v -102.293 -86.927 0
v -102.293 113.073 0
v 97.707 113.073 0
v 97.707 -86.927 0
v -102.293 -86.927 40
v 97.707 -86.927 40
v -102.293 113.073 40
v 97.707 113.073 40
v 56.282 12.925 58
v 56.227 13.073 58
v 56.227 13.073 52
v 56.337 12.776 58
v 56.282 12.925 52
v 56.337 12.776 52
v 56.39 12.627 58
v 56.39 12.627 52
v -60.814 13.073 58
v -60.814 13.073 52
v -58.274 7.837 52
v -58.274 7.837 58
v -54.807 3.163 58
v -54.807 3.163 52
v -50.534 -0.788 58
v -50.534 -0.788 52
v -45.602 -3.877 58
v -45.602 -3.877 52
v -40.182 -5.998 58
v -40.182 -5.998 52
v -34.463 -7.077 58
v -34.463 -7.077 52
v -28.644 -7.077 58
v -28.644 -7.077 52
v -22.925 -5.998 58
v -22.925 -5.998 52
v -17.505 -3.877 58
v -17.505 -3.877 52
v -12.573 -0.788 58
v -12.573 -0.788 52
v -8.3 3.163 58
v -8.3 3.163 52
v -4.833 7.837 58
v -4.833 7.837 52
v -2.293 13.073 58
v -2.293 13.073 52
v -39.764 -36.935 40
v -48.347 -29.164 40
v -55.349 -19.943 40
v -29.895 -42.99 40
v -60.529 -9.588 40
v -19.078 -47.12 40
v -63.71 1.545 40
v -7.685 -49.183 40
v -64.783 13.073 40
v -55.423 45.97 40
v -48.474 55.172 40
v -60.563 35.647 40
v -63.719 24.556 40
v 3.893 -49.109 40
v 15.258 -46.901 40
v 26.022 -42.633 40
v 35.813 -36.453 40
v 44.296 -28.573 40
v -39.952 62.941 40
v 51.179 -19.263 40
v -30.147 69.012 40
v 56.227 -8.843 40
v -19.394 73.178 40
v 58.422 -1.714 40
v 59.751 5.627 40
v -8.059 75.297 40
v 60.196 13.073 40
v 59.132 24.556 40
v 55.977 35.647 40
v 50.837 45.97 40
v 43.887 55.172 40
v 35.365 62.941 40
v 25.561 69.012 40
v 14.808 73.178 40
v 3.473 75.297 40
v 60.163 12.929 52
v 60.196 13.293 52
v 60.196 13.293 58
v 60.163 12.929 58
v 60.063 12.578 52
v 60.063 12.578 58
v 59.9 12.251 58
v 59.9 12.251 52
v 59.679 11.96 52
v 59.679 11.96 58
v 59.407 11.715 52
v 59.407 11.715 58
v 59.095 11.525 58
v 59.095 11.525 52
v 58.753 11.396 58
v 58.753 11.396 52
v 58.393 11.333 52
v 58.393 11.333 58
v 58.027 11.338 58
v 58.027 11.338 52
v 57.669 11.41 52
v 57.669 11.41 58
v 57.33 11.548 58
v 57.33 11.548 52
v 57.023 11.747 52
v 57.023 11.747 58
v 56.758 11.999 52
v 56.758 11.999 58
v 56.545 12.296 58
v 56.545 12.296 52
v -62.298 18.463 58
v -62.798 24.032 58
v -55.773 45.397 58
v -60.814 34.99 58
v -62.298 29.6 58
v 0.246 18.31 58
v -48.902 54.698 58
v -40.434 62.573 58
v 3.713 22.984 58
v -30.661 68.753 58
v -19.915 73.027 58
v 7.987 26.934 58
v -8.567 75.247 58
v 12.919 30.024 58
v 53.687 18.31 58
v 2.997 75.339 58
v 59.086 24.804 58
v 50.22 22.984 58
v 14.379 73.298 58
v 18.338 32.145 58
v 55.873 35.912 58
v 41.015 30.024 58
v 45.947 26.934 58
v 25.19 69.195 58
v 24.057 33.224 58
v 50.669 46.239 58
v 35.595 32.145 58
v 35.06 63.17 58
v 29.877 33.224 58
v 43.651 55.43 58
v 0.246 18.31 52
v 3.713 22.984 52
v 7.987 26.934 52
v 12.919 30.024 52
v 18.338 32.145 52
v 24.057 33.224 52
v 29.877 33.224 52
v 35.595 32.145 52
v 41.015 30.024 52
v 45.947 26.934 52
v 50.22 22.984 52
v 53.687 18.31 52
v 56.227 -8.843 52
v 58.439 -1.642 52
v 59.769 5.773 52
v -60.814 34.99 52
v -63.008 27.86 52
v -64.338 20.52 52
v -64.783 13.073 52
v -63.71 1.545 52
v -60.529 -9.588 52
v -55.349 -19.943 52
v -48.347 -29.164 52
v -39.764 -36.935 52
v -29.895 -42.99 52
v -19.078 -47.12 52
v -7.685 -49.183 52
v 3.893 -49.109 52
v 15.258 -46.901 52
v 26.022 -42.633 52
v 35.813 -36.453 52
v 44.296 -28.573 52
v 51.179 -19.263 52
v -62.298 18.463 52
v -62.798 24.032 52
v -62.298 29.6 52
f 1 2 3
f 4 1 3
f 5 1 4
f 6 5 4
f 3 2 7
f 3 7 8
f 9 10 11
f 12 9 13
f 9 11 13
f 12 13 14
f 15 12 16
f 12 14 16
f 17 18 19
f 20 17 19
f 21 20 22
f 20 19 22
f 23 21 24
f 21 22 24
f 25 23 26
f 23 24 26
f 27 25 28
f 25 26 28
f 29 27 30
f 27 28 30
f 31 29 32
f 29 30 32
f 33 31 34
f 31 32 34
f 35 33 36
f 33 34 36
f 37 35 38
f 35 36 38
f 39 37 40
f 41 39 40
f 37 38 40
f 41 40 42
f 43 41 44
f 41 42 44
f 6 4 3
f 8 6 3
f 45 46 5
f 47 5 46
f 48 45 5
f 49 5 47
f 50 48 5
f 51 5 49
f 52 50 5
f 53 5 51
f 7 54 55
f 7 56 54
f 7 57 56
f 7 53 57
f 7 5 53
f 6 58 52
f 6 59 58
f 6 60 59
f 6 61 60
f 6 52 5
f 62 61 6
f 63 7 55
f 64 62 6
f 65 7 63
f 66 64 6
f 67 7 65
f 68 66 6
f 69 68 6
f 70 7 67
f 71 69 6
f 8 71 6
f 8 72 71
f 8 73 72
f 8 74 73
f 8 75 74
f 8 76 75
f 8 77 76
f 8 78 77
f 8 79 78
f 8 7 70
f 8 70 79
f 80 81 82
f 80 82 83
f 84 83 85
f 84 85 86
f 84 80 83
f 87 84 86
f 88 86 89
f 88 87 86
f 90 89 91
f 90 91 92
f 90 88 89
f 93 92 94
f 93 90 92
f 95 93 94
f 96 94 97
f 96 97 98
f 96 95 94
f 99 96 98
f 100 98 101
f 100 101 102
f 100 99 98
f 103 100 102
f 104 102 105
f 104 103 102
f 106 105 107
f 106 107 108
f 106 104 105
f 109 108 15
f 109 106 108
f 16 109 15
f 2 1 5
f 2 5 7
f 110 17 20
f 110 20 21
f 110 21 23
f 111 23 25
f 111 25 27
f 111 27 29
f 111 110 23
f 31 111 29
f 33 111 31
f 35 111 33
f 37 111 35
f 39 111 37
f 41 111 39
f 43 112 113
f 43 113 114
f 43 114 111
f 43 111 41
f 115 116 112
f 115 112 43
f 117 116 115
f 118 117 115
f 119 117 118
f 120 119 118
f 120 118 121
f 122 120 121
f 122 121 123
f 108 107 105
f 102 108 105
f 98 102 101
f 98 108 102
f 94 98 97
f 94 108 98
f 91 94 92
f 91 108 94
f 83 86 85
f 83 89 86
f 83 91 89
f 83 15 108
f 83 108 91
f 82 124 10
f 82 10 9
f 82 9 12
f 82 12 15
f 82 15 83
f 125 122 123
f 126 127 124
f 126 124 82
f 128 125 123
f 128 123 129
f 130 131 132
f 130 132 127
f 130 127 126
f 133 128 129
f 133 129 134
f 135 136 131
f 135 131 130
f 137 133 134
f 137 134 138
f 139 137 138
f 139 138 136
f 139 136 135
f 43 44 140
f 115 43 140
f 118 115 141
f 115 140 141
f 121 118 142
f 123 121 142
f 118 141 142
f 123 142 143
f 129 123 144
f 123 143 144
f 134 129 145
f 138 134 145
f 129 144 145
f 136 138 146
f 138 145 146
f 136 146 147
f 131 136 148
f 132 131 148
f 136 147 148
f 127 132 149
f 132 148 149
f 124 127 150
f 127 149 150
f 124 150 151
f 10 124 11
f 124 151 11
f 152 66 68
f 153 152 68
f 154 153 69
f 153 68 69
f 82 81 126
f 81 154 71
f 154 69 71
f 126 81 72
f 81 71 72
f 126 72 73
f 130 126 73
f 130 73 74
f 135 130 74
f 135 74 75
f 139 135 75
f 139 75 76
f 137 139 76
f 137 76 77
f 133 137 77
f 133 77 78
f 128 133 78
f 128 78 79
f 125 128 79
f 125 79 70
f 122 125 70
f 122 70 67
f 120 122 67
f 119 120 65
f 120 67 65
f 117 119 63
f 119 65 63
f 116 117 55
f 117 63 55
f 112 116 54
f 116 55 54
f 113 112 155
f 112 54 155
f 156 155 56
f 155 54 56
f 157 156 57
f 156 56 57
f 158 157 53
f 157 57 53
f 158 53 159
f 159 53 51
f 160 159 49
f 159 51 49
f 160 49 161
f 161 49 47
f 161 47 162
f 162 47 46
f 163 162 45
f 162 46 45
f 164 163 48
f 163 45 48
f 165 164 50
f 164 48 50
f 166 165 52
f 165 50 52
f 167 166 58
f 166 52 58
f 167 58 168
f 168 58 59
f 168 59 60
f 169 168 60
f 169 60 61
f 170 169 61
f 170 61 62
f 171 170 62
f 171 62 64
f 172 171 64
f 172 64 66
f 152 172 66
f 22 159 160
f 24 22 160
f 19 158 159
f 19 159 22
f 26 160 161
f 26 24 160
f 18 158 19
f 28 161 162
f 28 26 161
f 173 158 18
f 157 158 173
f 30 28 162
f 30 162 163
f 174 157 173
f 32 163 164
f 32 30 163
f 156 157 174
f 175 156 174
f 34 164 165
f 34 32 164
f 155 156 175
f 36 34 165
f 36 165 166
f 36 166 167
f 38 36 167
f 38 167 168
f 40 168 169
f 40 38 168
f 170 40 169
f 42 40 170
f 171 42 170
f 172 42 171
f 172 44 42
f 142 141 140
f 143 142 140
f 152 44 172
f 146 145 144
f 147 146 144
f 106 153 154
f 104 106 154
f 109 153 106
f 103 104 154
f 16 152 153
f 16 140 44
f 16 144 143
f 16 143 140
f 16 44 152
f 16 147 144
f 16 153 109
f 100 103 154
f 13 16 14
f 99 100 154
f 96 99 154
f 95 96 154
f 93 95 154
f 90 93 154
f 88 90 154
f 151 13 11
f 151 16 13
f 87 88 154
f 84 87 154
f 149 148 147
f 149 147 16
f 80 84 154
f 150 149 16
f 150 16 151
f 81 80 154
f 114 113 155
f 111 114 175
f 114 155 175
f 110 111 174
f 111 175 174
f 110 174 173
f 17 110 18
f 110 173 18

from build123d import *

# Parameters (mm, degrees)
F0_W        = 200
F0_H        = 200
F1_DEPTH    = 40
F3_DEPTH    = 12
F4_DEPTH    = 18
F5_T1_DEPTH = 62.2240943671


# Not quite as in the source:
# - a fillet or chamfer that OpenCascade refuses, or shapes differently, is made with other operations: its cross-section is extruded or revolved along the edge and cut away or added


with BuildPart() as f1:
    # F0 (on Top) → F1 (new body)
    with BuildSketch(Plane.XY):
        with Locations((-2.2933091968, 13.0733736824)):
            Rectangle(F0_W, F0_H)
    extrude(amount=F1_DEPTH)

    # F2 (on face) → F3 (join)
    with BuildSketch(Plane.XY.offset(40)):
        with BuildLine():
            Line((56.2270847505, 13.0733736824), (60.1964650758, 13.0733736824))
            ThreePointArc((60.1964650758, 13.0733736824), (8.8432450397, 74.5627959303), (-60.8137031442, 34.9899286326))
            ThreePointArc((-60.8137031442, 34.9899286326), (-62.7983933068, 24.0316511575), (-60.8137031442, 13.0733736824))
            Line((-60.8137031442, 13.0733736824), (-2.2933091968, 13.0733736824))
            ThreePointArc((-2.2933091968, 13.0733736824), (26.9668877768, 33.3599833436), (56.2270847505, 13.0733736824))
        make_face()
        with BuildLine():
            Line((-2.2933091968, 13.0733736824), (-60.8137031442, 13.0733736824))
            ThreePointArc((-60.8137031442, 13.0733736824), (-31.5535061705, -7.2132359788), (-2.2933091968, 13.0733736824))
        make_face()
        with BuildLine():
            ThreePointArc((-64.7830834694, 13.0733736824), (-13.4298634334, -48.4160485655), (56.2270847505, -8.8431812678))
            ThreePointArc((56.2270847505, -8.8431812678), (58.2117749131, 2.1150962073), (56.2270847505, 13.0733736824))
            Line((56.2270847505, 13.0733736824), (-2.2933091968, 13.0733736824))
            ThreePointArc((-2.2933091968, 13.0733736824), (-31.5535061705, -7.2132359788), (-60.8137031442, 13.0733736824))
            Line((-60.8137031442, 13.0733736824), (-64.7830834694, 13.0733736824))
        make_face()
        with BuildLine():
            ThreePointArc((-60.8137031442, 13.0733736824), (-62.7983933068, 24.0316511575), (-60.8137031442, 34.9899286326))
            ThreePointArc((-60.8137031442, 34.9899286326), (-63.7827314447, 24.2099279189), (-64.7830834694, 13.0733736824))
            Line((-64.7830834694, 13.0733736824), (-60.8137031442, 13.0733736824))
        make_face()
        with BuildLine():
            Line((-2.2933091968, 13.0733736824), (56.2270847505, 13.0733736824))
            ThreePointArc((56.2270847505, 13.0733736824), (26.9668877768, 33.3599833436), (-2.2933091968, 13.0733736824))
        make_face()
        with BuildLine():
            ThreePointArc((56.2270847505, -8.8431812678), (59.196113051, 1.9368194459), (60.1964650758, 13.0733736824))
            Line((60.1964650758, 13.0733736824), (56.2270847505, 13.0733736824))
            ThreePointArc((56.2270847505, 13.0733736824), (58.2117749131, 2.1150962073), (56.2270847505, -8.8431812678))
        make_face()
    extrude(amount=F3_DEPTH)

    # F2 (on face) → F4 (join)
    with BuildSketch(Plane.XY.offset(40)):
        with BuildLine():
            Line((56.2270847505, 13.0733736824), (60.1964650758, 13.0733736824))
            ThreePointArc((60.1964650758, 13.0733736824), (8.8432450397, 74.5627959303), (-60.8137031442, 34.9899286326))
            ThreePointArc((-60.8137031442, 34.9899286326), (-62.7983933068, 24.0316511575), (-60.8137031442, 13.0733736824))
            Line((-60.8137031442, 13.0733736824), (-2.2933091968, 13.0733736824))
            ThreePointArc((-2.2933091968, 13.0733736824), (26.9668877768, 33.3599833436), (56.2270847505, 13.0733736824))
        make_face()
        with BuildLine():
            Line((-2.2933091968, 13.0733736824), (-60.8137031442, 13.0733736824))
            ThreePointArc((-60.8137031442, 13.0733736824), (-31.5535061705, -7.2132359788), (-2.2933091968, 13.0733736824))
        make_face()
        with BuildLine():
            ThreePointArc((56.2270847505, -8.8431812678), (59.196113051, 1.9368194459), (60.1964650758, 13.0733736824))
            Line((60.1964650758, 13.0733736824), (56.2270847505, 13.0733736824))
            ThreePointArc((56.2270847505, 13.0733736824), (58.2117749131, 2.1150962073), (56.2270847505, -8.8431812678))
        make_face()
    extrude(amount=F4_DEPTH)

    # F5: fillet of radius 1.96 on 2 edges, made by hand

    # F5_s2 → F5_t1 (cut)
    with BuildSketch(Plane.XY.offset(52)):
        with BuildLine():
            ThreePointArc((60.196077506, 13.2934603584), (58.5741142709, 11.3559254547), (56.3903482373, 12.627134387))
            ThreePointArc((56.3903482373, 12.627134387), (58.2108716144, 1.8775122879), (56.2270847505, -8.8431812678))
            ThreePointArc((56.2270847505, -8.8431812678), (59.2156290063, 2.0451186179), (60.196077506, 13.2934603584))
        make_face()
    extrude(amount=F5_T1_DEPTH, mode=Mode.SUBTRACT)


solid = f1.part
